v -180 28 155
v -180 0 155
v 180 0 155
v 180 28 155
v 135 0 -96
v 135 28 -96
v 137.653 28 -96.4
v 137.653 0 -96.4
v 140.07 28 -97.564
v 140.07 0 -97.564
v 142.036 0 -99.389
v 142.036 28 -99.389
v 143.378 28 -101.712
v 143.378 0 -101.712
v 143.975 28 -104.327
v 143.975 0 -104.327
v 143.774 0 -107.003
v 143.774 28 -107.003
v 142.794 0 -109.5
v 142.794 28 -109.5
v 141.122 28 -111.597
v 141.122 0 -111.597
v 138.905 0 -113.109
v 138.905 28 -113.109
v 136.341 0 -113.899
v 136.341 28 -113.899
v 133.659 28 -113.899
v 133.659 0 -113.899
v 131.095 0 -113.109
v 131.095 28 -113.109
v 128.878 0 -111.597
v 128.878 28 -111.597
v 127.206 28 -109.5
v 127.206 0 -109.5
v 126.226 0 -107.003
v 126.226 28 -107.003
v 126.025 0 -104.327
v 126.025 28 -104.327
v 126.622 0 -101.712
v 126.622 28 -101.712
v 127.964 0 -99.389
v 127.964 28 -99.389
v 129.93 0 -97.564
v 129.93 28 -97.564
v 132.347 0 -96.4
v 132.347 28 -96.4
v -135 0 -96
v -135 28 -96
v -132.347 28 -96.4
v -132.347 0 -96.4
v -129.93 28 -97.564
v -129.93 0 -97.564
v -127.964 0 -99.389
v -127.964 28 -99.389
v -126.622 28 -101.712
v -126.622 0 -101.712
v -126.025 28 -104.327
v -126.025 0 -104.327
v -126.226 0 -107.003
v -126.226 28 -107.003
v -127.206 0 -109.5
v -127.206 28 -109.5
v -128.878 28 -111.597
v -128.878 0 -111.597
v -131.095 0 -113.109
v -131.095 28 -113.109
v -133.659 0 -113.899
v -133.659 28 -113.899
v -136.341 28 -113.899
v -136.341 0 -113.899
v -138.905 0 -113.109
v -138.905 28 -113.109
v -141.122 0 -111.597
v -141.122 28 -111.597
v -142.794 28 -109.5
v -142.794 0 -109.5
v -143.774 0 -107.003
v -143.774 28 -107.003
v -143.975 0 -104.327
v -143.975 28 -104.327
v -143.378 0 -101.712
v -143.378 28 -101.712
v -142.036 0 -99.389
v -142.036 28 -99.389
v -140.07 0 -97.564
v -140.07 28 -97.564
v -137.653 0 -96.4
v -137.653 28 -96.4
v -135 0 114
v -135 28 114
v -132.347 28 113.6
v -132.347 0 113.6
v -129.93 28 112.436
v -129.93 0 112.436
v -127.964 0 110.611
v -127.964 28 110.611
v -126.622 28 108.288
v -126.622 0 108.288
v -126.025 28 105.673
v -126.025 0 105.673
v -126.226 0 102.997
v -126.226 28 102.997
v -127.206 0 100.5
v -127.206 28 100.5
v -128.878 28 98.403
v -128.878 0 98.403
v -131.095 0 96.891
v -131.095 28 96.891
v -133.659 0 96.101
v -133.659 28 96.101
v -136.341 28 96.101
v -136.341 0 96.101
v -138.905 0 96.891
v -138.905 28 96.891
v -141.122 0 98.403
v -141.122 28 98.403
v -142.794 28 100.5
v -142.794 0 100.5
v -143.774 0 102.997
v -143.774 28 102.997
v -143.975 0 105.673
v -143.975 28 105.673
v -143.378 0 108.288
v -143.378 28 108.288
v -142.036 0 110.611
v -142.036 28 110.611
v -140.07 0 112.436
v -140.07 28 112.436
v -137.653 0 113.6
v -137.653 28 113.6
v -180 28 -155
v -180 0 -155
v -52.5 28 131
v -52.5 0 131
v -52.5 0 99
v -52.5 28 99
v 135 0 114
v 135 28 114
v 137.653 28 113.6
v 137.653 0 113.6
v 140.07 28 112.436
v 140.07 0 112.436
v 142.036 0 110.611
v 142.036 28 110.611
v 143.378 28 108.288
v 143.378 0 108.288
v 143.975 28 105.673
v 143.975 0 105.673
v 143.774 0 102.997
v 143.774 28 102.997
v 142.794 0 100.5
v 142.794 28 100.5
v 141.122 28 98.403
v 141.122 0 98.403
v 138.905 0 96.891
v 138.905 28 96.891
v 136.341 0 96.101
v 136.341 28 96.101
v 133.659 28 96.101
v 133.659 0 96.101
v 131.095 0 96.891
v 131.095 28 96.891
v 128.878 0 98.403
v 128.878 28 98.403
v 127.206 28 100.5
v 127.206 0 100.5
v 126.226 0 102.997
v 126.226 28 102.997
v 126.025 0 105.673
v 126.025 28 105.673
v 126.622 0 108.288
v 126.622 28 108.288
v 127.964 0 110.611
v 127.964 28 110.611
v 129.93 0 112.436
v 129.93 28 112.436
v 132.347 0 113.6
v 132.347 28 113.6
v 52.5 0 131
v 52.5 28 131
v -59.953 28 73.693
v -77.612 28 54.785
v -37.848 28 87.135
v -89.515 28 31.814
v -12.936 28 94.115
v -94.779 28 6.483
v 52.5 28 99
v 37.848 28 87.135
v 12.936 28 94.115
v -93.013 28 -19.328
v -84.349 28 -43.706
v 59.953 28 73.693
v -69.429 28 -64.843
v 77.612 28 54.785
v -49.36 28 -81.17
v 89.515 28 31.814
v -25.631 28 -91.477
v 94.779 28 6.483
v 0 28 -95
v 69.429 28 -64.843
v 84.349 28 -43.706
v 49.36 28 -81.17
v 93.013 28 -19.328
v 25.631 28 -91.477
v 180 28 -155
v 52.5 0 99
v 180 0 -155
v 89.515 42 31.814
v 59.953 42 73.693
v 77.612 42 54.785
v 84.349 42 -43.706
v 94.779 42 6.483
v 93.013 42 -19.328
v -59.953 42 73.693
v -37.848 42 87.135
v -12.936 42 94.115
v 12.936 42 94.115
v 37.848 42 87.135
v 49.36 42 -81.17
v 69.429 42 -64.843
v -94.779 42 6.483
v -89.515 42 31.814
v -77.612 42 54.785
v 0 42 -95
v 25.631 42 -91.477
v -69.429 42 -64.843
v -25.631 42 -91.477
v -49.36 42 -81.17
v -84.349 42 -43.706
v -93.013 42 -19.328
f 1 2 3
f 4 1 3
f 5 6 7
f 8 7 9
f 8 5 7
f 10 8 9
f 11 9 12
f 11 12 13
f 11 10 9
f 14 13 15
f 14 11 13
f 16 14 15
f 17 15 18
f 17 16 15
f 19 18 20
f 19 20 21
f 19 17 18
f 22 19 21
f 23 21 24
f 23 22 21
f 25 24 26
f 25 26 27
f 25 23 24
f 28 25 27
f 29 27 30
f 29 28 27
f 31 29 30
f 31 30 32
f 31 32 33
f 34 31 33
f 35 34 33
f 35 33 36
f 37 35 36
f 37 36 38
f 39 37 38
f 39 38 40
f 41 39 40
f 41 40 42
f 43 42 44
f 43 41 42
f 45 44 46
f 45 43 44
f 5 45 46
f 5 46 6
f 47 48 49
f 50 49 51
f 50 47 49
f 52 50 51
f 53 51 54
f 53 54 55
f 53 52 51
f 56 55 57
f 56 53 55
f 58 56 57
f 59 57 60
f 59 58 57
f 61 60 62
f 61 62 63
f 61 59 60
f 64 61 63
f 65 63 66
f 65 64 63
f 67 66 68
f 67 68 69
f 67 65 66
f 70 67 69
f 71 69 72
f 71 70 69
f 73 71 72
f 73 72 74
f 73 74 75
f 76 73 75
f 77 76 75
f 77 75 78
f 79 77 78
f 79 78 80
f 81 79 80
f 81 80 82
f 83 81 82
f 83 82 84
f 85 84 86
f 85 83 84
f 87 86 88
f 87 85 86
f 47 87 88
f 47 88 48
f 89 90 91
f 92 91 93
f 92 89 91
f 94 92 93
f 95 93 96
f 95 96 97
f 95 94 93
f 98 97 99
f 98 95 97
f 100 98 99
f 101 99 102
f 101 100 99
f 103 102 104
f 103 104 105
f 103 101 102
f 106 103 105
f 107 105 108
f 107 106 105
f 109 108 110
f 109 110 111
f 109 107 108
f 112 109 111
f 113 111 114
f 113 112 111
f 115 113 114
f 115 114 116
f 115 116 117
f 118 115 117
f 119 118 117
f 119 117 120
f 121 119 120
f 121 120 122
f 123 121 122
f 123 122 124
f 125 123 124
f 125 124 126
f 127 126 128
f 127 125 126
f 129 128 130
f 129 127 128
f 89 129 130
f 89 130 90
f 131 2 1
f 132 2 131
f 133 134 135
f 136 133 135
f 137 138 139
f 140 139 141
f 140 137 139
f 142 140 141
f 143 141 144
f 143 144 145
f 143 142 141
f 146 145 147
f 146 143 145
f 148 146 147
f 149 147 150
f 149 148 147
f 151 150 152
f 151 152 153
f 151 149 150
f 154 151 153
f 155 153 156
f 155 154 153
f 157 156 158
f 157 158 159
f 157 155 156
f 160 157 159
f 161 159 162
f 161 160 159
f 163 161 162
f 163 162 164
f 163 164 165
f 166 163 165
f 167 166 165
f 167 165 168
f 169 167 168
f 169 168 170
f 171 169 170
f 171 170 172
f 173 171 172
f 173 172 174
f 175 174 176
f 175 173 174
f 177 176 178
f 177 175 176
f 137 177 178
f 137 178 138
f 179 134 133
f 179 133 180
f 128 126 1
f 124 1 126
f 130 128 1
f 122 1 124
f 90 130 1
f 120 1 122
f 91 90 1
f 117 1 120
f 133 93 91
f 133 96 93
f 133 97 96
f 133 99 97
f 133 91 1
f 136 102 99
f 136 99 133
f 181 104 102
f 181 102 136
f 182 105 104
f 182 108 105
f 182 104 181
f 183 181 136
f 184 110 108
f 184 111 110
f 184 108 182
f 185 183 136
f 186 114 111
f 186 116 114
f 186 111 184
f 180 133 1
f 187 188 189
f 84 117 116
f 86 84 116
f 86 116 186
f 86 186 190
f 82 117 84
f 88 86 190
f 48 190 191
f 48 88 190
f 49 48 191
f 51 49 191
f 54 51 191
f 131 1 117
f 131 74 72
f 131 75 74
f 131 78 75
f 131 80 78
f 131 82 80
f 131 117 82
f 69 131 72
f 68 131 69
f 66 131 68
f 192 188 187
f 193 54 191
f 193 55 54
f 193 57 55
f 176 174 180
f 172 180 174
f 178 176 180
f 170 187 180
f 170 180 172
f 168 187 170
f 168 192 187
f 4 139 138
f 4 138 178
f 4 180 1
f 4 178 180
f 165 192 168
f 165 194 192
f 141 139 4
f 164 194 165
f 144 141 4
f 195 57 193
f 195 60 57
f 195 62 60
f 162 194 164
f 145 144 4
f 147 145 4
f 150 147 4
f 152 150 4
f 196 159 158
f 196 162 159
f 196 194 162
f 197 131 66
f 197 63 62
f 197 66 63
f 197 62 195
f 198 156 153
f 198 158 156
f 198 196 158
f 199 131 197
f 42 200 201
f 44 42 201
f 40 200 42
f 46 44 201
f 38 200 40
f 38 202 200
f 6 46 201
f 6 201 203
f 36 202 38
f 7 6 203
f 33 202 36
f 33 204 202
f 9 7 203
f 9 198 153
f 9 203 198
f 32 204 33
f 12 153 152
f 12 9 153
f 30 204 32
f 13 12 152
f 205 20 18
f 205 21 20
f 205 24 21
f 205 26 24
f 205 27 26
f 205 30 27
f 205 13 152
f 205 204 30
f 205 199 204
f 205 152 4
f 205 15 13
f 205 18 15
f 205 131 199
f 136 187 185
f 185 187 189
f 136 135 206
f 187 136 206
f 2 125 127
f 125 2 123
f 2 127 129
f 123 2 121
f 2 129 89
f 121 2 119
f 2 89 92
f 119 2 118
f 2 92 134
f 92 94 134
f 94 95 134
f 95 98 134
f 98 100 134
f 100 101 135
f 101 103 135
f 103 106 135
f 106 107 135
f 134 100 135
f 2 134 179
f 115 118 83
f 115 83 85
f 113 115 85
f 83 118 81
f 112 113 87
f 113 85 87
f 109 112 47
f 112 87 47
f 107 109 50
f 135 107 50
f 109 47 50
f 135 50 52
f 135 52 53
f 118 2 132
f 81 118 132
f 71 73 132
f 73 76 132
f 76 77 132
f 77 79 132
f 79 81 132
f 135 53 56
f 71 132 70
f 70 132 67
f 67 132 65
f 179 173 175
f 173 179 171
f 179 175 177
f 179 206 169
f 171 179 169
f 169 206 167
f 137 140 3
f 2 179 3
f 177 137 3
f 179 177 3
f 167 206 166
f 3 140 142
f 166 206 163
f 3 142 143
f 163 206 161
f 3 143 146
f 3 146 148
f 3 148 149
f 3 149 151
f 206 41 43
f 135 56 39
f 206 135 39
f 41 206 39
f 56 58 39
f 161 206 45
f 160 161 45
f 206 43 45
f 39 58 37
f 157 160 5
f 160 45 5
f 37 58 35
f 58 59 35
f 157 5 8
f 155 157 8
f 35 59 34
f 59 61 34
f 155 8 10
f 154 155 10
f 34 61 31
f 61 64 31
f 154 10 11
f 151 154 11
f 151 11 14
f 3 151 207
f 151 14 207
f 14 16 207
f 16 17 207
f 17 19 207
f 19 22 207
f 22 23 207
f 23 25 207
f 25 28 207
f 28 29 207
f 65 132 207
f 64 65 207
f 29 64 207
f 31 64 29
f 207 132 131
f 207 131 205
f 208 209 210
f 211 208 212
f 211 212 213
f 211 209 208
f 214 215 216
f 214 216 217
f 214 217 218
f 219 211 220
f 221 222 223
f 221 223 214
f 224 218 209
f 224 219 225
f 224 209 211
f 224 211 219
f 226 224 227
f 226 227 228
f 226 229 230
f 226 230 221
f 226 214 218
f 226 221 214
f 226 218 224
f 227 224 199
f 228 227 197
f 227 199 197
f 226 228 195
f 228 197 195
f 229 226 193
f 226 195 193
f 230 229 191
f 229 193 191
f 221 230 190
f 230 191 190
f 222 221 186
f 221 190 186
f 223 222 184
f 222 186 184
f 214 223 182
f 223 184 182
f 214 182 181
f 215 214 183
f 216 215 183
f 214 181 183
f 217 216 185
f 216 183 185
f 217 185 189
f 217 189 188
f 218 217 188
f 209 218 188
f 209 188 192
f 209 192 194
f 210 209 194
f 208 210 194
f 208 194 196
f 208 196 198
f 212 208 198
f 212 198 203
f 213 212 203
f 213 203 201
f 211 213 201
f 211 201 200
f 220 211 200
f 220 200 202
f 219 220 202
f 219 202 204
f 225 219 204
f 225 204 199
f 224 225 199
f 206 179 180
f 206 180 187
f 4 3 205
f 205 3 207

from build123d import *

# Parameters (mm, degrees)
F_01_BASE_PROFILE_W           = 360
F_01_BASE_PROFILE_H           = 310
F_01_BASE_PROFILE_R           = 62.5
F_01_BASE_PROFILE_R_2         = 9
F_01_BASE_PROFILE_W_2         = 105
F_01_BASE_PROFILE_H_2         = 32
F_01_BASE_EXTRUDE_DEPTH       = 28
F_02_BOSS_PROFILE_R           = 95
F_02_REINFORCEMENT_BOSS_DEPTH = 42


with BuildPart() as part:
    # 01_Base_Profile → 01_Base_Extrude (new body)
    with BuildSketch(Plane(origin=(0, 0, 0), x_dir=(1, 0, 0), z_dir=(0, 1, 0))):
        Rectangle(F_01_BASE_PROFILE_W, F_01_BASE_PROFILE_H)
        with Locations(Location((0, 0, 0), (0, 0, 270))):
            Circle(F_01_BASE_PROFILE_R, mode=Mode.SUBTRACT)
        with Locations(Location((-135, -105, 0), (0, 0, 270))):
            Circle(F_01_BASE_PROFILE_R_2, mode=Mode.SUBTRACT)
        with Locations(Location((135, -105, 0), (0, 0, 270))):
            Circle(F_01_BASE_PROFILE_R_2, mode=Mode.SUBTRACT)
        with Locations(Location((-135, 105, 0), (0, 0, 270))):
            Circle(F_01_BASE_PROFILE_R_2, mode=Mode.SUBTRACT)
        with Locations(Location((135, 105, 0), (0, 0, 270))):
            Circle(F_01_BASE_PROFILE_R_2, mode=Mode.SUBTRACT)
        with Locations((0, -115)):
            Rectangle(F_01_BASE_PROFILE_W_2, F_01_BASE_PROFILE_H_2, mode=Mode.SUBTRACT)
    extrude(amount=F_01_BASE_EXTRUDE_DEPTH)

    # 02_Boss_Profile → 02_Reinforcement_Boss (add)
    with BuildSketch(Plane(origin=(0, 0, 0), x_dir=(1, 0, 0), z_dir=(0, 1, 0))):
        with Locations(Location((0, 0, 0), (0, 0, 90))):
            Circle(F_02_BOSS_PROFILE_R)
    extrude(amount=F_02_REINFORCEMENT_BOSS_DEPTH)


solid = part.part
